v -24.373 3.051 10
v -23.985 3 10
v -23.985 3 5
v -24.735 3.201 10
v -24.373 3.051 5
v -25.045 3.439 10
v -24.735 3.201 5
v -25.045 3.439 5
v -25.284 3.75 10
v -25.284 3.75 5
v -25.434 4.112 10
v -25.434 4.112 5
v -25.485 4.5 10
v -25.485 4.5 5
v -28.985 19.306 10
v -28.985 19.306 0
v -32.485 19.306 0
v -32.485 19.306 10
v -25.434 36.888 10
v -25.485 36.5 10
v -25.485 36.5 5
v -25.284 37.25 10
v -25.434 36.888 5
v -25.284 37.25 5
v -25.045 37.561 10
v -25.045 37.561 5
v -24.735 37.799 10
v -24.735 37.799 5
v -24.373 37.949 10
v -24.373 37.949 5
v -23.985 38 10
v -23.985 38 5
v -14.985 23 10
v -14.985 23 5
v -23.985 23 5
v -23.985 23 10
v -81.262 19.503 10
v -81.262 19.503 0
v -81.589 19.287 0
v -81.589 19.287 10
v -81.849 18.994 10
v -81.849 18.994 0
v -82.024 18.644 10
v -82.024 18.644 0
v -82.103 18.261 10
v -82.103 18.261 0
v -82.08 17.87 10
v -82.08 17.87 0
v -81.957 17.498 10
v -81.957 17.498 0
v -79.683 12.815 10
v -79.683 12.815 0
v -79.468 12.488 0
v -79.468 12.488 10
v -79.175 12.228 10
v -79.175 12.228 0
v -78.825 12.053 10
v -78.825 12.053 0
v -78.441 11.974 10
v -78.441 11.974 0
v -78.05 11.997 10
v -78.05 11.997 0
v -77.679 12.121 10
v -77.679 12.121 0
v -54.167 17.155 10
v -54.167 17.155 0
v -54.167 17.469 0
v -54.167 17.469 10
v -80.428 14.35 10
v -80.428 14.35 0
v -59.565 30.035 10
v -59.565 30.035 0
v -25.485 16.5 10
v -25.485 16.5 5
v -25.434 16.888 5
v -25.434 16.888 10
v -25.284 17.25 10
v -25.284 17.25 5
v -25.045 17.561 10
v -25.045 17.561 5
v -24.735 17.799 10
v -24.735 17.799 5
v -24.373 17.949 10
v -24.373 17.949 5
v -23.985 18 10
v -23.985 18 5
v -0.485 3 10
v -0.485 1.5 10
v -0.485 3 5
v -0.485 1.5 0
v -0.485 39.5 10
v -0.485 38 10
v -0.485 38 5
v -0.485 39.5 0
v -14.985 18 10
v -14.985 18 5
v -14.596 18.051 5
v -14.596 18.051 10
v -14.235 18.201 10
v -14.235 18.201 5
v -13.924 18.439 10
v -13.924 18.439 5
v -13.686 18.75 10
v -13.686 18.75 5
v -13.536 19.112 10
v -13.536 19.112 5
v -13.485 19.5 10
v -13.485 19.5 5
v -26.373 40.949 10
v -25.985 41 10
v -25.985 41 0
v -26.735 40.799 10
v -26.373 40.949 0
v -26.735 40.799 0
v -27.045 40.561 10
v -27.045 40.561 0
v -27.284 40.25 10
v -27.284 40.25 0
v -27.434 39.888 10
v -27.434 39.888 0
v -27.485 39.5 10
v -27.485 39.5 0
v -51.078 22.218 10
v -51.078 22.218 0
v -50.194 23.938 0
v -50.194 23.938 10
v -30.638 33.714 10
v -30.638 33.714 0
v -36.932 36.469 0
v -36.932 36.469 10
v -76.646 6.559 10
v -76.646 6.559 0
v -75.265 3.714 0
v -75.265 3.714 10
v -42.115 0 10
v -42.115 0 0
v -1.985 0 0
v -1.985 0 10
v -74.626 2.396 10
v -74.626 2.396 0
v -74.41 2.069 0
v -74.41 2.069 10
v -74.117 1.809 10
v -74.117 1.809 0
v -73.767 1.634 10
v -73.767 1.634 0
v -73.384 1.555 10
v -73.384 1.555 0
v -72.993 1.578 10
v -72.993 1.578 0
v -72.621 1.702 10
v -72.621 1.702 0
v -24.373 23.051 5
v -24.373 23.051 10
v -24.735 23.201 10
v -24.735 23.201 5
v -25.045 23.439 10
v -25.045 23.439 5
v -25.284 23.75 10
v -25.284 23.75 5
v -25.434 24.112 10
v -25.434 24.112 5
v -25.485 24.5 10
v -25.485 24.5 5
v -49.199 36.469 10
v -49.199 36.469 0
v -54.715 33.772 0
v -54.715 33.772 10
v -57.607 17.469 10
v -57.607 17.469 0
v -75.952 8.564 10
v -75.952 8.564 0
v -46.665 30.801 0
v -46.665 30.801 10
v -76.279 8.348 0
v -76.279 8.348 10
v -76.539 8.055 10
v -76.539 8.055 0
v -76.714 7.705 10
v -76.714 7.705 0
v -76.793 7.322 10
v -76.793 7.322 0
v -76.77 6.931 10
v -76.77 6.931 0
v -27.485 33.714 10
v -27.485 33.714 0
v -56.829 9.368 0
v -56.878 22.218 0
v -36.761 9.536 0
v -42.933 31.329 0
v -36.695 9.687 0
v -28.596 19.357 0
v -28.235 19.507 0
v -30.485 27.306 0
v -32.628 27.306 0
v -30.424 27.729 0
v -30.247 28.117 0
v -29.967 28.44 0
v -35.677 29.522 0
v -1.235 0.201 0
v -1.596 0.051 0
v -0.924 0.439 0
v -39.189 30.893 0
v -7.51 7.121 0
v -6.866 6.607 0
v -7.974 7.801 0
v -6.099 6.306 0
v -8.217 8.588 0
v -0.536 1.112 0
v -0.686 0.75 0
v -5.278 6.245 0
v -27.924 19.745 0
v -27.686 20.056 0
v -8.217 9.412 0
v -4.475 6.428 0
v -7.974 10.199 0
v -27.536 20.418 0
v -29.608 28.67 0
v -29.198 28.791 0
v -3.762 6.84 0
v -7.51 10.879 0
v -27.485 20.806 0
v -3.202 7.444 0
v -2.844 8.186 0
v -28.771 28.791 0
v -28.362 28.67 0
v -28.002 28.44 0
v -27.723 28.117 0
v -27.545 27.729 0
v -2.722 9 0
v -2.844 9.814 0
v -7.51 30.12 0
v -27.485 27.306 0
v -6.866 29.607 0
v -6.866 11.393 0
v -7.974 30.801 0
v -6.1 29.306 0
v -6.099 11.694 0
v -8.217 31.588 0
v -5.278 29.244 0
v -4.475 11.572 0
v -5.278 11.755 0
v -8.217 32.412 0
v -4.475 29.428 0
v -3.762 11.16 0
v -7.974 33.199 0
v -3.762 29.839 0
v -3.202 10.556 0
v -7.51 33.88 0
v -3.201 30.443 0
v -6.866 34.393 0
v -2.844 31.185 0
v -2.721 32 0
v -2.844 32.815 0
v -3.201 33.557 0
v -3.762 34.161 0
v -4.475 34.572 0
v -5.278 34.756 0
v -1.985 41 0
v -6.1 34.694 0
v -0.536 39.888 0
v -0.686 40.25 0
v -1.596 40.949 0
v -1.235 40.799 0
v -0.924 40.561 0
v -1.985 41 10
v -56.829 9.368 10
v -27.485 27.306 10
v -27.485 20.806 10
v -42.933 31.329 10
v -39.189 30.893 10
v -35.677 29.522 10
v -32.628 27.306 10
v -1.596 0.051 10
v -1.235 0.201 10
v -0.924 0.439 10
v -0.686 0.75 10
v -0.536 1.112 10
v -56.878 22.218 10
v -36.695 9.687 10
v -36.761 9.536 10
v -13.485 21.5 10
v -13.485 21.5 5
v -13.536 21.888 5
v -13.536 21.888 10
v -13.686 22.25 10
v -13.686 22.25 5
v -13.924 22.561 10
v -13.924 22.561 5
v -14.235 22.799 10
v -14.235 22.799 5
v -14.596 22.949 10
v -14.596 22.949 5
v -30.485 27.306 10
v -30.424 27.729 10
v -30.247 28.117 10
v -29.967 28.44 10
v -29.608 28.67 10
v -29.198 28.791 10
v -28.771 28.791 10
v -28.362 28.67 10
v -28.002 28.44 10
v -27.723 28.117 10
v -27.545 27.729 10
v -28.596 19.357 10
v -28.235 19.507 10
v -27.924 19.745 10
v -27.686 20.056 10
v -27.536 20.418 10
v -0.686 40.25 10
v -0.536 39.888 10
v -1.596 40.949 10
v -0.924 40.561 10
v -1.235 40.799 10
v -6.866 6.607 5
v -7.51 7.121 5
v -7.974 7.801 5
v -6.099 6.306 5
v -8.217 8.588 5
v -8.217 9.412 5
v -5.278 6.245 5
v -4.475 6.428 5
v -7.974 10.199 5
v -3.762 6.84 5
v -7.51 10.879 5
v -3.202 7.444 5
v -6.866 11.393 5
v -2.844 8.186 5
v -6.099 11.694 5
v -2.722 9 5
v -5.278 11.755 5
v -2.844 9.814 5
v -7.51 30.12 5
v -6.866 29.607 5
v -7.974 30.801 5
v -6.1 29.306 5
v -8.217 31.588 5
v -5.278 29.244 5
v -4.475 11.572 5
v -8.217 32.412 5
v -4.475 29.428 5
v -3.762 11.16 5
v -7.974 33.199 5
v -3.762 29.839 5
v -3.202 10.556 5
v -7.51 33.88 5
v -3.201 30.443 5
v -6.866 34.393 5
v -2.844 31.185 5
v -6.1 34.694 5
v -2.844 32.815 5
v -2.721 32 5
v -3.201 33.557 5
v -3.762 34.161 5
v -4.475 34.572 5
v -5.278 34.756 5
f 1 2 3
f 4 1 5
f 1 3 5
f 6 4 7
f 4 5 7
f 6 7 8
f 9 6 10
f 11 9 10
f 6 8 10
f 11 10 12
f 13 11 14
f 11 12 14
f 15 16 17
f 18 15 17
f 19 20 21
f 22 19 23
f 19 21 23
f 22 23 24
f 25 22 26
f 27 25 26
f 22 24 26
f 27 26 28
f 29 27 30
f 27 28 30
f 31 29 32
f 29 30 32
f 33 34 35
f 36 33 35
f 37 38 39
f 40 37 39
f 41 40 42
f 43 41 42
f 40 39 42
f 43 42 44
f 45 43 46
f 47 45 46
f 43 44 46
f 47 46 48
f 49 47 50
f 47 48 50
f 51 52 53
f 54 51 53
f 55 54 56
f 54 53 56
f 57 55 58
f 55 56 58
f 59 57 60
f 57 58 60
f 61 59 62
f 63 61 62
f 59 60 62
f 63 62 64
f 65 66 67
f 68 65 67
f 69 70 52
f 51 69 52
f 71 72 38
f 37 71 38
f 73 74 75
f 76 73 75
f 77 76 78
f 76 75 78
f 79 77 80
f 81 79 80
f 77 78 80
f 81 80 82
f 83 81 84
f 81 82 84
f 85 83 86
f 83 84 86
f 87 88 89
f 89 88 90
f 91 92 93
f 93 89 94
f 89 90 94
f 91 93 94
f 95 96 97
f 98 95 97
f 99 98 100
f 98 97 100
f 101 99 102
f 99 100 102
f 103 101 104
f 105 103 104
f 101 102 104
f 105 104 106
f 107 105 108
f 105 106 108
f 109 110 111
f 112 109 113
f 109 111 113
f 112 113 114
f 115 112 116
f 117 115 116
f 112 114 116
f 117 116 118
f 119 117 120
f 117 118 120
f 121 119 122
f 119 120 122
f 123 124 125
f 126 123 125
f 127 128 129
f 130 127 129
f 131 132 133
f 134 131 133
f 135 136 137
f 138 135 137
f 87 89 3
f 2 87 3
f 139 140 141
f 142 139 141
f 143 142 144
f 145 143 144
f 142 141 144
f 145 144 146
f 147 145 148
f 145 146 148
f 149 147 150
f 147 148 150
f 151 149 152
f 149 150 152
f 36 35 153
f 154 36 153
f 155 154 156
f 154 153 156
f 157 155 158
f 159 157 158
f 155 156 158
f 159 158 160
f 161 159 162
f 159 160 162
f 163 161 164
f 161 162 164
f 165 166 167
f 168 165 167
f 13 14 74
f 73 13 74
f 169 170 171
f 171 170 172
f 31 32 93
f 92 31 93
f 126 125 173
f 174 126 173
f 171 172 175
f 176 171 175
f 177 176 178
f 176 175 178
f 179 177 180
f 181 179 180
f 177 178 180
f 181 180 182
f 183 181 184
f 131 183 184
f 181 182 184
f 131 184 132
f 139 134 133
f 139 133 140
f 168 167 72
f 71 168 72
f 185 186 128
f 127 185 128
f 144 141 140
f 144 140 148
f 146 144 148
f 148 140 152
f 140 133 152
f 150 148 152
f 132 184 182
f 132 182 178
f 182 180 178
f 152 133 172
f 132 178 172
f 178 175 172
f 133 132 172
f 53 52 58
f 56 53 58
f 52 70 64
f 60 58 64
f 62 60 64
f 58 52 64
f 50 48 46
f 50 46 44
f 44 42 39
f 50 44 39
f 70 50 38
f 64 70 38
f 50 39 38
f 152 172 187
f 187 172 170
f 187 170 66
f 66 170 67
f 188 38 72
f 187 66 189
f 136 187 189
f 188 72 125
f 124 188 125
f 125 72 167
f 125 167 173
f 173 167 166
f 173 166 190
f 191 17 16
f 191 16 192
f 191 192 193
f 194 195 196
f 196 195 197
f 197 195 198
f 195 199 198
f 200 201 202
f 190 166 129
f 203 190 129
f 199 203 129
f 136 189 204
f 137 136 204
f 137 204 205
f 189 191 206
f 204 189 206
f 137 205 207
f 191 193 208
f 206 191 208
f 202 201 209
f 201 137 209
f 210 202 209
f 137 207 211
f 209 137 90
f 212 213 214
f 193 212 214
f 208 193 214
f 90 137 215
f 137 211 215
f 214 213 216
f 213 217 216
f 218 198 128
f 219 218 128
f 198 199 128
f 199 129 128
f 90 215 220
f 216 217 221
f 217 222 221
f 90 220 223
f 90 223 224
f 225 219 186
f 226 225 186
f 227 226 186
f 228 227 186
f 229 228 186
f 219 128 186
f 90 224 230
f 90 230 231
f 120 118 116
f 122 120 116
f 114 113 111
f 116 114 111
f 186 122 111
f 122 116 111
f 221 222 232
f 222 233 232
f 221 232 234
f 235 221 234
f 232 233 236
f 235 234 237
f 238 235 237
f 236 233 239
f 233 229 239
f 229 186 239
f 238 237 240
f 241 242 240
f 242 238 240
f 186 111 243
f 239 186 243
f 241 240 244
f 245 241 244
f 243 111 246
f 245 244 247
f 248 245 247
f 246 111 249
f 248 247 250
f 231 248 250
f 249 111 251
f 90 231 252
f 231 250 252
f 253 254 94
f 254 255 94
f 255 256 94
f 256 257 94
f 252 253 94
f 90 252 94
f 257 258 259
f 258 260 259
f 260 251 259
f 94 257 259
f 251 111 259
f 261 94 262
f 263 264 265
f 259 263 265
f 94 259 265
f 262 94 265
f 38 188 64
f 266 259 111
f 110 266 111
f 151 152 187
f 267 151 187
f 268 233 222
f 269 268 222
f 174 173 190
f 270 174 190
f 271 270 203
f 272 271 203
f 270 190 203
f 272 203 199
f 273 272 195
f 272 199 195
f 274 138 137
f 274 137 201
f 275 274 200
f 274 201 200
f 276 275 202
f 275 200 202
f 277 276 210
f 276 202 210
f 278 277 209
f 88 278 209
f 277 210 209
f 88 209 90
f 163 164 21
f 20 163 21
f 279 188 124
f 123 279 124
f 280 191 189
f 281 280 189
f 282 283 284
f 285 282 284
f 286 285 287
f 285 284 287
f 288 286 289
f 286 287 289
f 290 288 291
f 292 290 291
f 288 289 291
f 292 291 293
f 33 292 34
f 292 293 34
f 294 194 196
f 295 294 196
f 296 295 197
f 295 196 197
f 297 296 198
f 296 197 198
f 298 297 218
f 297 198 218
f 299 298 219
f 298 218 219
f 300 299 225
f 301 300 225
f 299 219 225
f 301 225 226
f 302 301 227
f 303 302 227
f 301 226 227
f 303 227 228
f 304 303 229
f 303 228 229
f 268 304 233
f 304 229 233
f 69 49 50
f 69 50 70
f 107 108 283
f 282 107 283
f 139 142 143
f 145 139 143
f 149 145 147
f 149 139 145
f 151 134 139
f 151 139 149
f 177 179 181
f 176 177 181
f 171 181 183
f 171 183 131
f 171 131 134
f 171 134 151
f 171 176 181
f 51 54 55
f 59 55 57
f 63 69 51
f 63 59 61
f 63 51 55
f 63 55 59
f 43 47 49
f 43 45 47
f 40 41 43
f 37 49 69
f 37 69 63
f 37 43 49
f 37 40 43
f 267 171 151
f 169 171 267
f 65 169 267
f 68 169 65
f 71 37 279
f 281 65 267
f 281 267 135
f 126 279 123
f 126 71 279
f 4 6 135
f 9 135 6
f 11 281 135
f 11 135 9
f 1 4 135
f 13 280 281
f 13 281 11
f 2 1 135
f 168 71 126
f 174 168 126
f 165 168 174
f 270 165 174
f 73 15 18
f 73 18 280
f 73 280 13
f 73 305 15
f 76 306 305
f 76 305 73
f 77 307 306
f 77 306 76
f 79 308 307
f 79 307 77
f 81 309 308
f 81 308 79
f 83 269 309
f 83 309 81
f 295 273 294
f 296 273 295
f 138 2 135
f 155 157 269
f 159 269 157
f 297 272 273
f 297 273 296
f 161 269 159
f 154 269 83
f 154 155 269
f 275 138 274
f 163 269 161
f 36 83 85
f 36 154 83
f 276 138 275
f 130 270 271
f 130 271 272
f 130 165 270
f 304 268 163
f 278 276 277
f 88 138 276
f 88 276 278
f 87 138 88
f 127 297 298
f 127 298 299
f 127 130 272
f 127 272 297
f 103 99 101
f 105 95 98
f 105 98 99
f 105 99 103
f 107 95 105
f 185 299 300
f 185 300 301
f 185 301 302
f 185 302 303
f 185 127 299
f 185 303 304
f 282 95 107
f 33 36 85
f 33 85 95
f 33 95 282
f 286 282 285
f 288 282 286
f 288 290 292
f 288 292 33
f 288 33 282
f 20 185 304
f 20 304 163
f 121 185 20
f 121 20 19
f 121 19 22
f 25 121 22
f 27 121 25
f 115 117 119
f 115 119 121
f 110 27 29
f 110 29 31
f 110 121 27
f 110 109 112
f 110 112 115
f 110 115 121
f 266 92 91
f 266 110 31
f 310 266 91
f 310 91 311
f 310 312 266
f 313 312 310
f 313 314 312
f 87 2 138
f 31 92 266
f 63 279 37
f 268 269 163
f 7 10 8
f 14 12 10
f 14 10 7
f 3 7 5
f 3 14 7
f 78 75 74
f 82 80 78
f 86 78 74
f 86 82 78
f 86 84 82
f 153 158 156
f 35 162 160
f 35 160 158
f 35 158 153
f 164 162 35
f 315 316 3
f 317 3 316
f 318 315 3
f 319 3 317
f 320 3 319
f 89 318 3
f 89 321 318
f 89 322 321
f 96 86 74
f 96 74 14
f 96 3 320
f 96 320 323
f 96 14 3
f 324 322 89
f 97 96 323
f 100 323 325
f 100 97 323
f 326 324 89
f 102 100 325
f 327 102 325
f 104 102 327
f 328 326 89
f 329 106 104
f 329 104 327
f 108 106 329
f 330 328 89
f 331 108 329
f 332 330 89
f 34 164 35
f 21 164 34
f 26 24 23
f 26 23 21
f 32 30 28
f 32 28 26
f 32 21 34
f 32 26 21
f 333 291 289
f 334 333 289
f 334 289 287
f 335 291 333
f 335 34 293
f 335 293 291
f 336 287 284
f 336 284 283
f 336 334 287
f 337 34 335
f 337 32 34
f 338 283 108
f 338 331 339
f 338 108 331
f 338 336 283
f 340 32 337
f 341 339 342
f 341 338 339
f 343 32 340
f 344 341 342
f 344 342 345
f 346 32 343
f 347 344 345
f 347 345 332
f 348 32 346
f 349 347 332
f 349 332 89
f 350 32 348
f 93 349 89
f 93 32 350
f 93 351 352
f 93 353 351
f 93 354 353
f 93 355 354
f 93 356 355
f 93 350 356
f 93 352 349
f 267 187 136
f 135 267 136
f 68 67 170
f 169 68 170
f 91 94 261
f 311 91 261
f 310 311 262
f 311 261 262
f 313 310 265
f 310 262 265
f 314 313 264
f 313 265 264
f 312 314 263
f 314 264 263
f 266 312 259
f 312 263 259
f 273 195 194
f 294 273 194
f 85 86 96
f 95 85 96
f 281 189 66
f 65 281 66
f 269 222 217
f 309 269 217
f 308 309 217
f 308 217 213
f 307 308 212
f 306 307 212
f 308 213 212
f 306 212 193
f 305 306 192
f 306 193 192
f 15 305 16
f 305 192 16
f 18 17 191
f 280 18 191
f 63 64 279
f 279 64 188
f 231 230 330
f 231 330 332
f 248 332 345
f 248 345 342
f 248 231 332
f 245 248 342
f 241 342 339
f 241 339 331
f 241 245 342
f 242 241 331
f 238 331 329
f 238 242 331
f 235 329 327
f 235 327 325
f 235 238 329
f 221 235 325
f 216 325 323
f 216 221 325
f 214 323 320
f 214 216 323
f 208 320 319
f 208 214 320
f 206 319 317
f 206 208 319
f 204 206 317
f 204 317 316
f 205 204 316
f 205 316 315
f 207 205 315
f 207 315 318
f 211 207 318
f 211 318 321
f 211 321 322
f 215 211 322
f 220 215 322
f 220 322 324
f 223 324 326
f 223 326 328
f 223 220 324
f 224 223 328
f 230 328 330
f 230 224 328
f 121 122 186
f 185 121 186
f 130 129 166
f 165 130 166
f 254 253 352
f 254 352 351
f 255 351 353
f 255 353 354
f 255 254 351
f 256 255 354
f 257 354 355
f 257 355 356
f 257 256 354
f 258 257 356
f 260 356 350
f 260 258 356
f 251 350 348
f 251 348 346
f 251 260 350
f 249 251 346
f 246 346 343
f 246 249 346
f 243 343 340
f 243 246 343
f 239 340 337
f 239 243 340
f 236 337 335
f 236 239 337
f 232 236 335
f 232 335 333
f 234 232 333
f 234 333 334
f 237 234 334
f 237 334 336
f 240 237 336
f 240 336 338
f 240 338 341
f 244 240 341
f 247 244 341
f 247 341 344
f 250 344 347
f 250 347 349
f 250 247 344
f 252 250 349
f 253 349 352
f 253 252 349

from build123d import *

# Parameters (mm, degrees)
F1_DEPTH = 10
F0_R     = 2.763
F0_R_2   = 2.7634135205
F2_DEPTH = 5


# Not quite as in the source:
# - a feature names something its author has since deleted; it is built from what else it names


with BuildPart() as f1:
    # F0 (on Top) → F1 (new body)
    with BuildSketch(Plane.XY):
        with BuildLine():
            Line((-28.9846330285, 19.3060322961), (-32.4846330285, 19.3060322961))
            Line((-32.4846330285, 19.3060322961), (-36.6950527355, 9.6871775882))
            Line((-36.6950527355, 9.6871775882), (-36.7611596752, 9.5361539153))
            Line((-36.7611596752, 9.5361539153), (-54.1667062895, 17.1550086232))
            Line((-54.1667062895, 17.1550086232), (-54.1667062895, 17.4688580502))
            Line((-54.1667062895, 17.4688580502), (-57.6066188446, 17.4688580502))
            Line((-57.6066188446, 17.4688580502), (-75.9521011029, 8.5636187846))
            ThreePointArc((-75.9521011029, 8.5636187846), (-76.7144296488, 7.7052047395), (-76.6464869407, 6.5591666629))
            Line((-76.6464869407, 6.5591666629), (-75.2652584401, 3.7137290281))
            Line((-75.2652584401, 3.7137290281), (-74.6256538324, 2.3960940233))
            ThreePointArc((-74.6256538324, 2.3960940233), (-73.7672397873, 1.6337654774), (-72.6212017107, 1.7017081855))
            Line((-72.6212017107, 1.7017081855), (-56.8289984312, 9.3675382114))
            Line((-56.8289984312, 9.3675382114), (-42.1148466106, 0))
            Line((-42.1148466106, 0), (-28.5, 0))
            Line((-28.5, 0), (-18.5, 0))
            Line((-18.5, 0), (-1.9846330285, 0))
            ThreePointArc((-1.9846330285, 0), (-0.9239728567, 0.4393398282), (-0.4846330285, 1.5))
            Line((-0.4846330285, 1.5), (-0.4846330285, 3))
            Line((-0.4846330285, 3), (-23.9846330285, 3))
            ThreePointArc((-23.9846330285, 3), (-25.0452932003, 3.4393398282), (-25.4846330285, 4.5))
            Line((-25.4846330285, 4.5), (-25.4846330285, 16.5))
            ThreePointArc((-25.4846330285, 16.5), (-25.0452932003, 17.5606601718), (-23.9846330285, 18))
            Line((-23.9846330285, 18), (-14.9846330285, 18))
            ThreePointArc((-14.9846330285, 18), (-13.9239728567, 18.4393398282), (-13.4846330285, 19.5))
            Line((-13.4846330285, 19.5), (-13.4846330285, 21.5))
            ThreePointArc((-13.4846330285, 21.5), (-13.9239728567, 22.5606601718), (-14.9846330285, 23))
            Line((-14.9846330285, 23), (-23.9846330285, 23))
            ThreePointArc((-23.9846330285, 23), (-25.0452932003, 23.4393398282), (-25.4846330285, 24.5))
            Line((-25.4846330285, 24.5), (-25.4846330285, 36.5))
            ThreePointArc((-25.4846330285, 36.5), (-25.0452932003, 37.5606601718), (-23.9846330285, 38))
            Line((-23.9846330285, 38), (-0.4846330285, 38))
            Line((-0.4846330285, 38), (-0.4846330285, 39.5))
            ThreePointArc((-0.4846330285, 39.5), (-0.9239728567, 40.5606601718), (-1.9846330285, 41))
            Line((-1.9846330285, 41), (-25.4846330285, 41))
            Line((-25.4846330285, 41), (-25.9846330285, 41))
            ThreePointArc((-25.9846330285, 41), (-27.0452932003, 40.5606601718), (-27.4846330285, 39.5))
            Line((-27.4846330285, 39.5), (-27.4846330285, 39.3057436331))
            Line((-27.4846330285, 39.3057436331), (-27.4846330285, 33.7137029542))
            Line((-27.4846330285, 33.7137029542), (-30.6379412534, 33.7137029542))
            Line((-30.6379412534, 33.7137029542), (-36.9315167422, 36.4685625576))
            Line((-36.9315167422, 36.4685625576), (-49.1994071018, 36.4685625576))
            Line((-49.1994071018, 36.4685625576), (-54.7152283086, 33.7718741409))
            Line((-54.7152283086, 33.7718741409), (-59.5651725871, 30.0348878412))
            Line((-59.5651725871, 30.0348878412), (-81.2621656129, 19.502762737))
            ThreePointArc((-81.2621656129, 19.502762737), (-82.0244941588, 18.6443486919), (-81.9565514507, 17.4983106153))
            Line((-81.9565514507, 17.4983106153), (-80.4281407861, 14.3496663292))
            Line((-80.4281407861, 14.3496663292), (-79.683210987, 12.8150532767))
            ThreePointArc((-79.683210987, 12.8150532767), (-78.8247969419, 12.0527247308), (-77.6787588653, 12.1206674389))
            Line((-77.6787588653, 12.1206674389), (-56.8778590157, 22.2178122015))
            Line((-56.8778590157, 22.2178122015), (-51.0782729994, 22.2178122015))
            Line((-51.0782729994, 22.2178122015), (-50.1937510157, 23.9381783364))
            Line((-50.1937510157, 23.9381783364), (-46.6653068671, 30.8008860291))
            ThreePointArc((-46.6653068671, 30.8008860291), (-39.1888505002, 30.8927845811), (-32.6282824459, 27.3060322961))
            Line((-32.6282824459, 27.3060322961), (-30.4846330285, 27.3060322961))
            ThreePointArc((-30.4846330285, 27.3060322961), (-28.9846330285, 28.8060322961), (-27.4846330285, 27.3060322961))
            Line((-27.4846330285, 27.3060322961), (-27.4846330285, 20.8060322961))
            ThreePointArc((-27.4846330285, 20.8060322961), (-27.9239728567, 19.7453721243), (-28.9846330285, 19.3060322961))
        make_face()
    extrude(amount=F1_DEPTH)

    # F0 (on Top) → F2 (join)
    with BuildSketch(Plane.XY):
        with BuildLine():
            Line((-23.9846330285, 3), (-0.4846330285, 3))
            Line((-0.4846330285, 3), (-0.4846330285, 3.0459866499))
            Line((-0.4846330285, 3.0459866499), (-0.4846330285, 37.9540133501))
            Line((-0.4846330285, 37.9540133501), (-0.4846330285, 38))
            Line((-0.4846330285, 38), (-23.9846330285, 38))
            ThreePointArc((-23.9846330285, 38), (-25.0452932003, 37.5606601718), (-25.4846330285, 36.5))
            Line((-25.4846330285, 36.5), (-25.4846330285, 24.5))
            ThreePointArc((-25.4846330285, 24.5), (-25.0452932003, 23.4393398282), (-23.9846330285, 23))
            Line((-23.9846330285, 23), (-14.9846330285, 23))
            ThreePointArc((-14.9846330285, 23), (-13.9239728567, 22.5606601718), (-13.4846330285, 21.5))
            Line((-13.4846330285, 21.5), (-13.4846330285, 19.5))
            ThreePointArc((-13.4846330285, 19.5), (-13.9239728567, 18.4393398282), (-14.9846330285, 18))
            Line((-14.9846330285, 18), (-23.9846330285, 18))
            ThreePointArc((-23.9846330285, 18), (-25.0452932003, 17.5606601718), (-25.4846330285, 16.5))
            Line((-25.4846330285, 16.5), (-25.4846330285, 4.5))
            ThreePointArc((-25.4846330285, 4.5), (-25.0452932003, 3.4393398282), (-23.9846330285, 3))
        make_face()
        with Locations((-5.4846330285, 9)):
            Circle(F0_R, mode=Mode.SUBTRACT)
        with Locations((-5.4846330285, 32)):
            Circle(F0_R_2, mode=Mode.SUBTRACT)
    extrude(amount=F2_DEPTH)


solid = f1.part
